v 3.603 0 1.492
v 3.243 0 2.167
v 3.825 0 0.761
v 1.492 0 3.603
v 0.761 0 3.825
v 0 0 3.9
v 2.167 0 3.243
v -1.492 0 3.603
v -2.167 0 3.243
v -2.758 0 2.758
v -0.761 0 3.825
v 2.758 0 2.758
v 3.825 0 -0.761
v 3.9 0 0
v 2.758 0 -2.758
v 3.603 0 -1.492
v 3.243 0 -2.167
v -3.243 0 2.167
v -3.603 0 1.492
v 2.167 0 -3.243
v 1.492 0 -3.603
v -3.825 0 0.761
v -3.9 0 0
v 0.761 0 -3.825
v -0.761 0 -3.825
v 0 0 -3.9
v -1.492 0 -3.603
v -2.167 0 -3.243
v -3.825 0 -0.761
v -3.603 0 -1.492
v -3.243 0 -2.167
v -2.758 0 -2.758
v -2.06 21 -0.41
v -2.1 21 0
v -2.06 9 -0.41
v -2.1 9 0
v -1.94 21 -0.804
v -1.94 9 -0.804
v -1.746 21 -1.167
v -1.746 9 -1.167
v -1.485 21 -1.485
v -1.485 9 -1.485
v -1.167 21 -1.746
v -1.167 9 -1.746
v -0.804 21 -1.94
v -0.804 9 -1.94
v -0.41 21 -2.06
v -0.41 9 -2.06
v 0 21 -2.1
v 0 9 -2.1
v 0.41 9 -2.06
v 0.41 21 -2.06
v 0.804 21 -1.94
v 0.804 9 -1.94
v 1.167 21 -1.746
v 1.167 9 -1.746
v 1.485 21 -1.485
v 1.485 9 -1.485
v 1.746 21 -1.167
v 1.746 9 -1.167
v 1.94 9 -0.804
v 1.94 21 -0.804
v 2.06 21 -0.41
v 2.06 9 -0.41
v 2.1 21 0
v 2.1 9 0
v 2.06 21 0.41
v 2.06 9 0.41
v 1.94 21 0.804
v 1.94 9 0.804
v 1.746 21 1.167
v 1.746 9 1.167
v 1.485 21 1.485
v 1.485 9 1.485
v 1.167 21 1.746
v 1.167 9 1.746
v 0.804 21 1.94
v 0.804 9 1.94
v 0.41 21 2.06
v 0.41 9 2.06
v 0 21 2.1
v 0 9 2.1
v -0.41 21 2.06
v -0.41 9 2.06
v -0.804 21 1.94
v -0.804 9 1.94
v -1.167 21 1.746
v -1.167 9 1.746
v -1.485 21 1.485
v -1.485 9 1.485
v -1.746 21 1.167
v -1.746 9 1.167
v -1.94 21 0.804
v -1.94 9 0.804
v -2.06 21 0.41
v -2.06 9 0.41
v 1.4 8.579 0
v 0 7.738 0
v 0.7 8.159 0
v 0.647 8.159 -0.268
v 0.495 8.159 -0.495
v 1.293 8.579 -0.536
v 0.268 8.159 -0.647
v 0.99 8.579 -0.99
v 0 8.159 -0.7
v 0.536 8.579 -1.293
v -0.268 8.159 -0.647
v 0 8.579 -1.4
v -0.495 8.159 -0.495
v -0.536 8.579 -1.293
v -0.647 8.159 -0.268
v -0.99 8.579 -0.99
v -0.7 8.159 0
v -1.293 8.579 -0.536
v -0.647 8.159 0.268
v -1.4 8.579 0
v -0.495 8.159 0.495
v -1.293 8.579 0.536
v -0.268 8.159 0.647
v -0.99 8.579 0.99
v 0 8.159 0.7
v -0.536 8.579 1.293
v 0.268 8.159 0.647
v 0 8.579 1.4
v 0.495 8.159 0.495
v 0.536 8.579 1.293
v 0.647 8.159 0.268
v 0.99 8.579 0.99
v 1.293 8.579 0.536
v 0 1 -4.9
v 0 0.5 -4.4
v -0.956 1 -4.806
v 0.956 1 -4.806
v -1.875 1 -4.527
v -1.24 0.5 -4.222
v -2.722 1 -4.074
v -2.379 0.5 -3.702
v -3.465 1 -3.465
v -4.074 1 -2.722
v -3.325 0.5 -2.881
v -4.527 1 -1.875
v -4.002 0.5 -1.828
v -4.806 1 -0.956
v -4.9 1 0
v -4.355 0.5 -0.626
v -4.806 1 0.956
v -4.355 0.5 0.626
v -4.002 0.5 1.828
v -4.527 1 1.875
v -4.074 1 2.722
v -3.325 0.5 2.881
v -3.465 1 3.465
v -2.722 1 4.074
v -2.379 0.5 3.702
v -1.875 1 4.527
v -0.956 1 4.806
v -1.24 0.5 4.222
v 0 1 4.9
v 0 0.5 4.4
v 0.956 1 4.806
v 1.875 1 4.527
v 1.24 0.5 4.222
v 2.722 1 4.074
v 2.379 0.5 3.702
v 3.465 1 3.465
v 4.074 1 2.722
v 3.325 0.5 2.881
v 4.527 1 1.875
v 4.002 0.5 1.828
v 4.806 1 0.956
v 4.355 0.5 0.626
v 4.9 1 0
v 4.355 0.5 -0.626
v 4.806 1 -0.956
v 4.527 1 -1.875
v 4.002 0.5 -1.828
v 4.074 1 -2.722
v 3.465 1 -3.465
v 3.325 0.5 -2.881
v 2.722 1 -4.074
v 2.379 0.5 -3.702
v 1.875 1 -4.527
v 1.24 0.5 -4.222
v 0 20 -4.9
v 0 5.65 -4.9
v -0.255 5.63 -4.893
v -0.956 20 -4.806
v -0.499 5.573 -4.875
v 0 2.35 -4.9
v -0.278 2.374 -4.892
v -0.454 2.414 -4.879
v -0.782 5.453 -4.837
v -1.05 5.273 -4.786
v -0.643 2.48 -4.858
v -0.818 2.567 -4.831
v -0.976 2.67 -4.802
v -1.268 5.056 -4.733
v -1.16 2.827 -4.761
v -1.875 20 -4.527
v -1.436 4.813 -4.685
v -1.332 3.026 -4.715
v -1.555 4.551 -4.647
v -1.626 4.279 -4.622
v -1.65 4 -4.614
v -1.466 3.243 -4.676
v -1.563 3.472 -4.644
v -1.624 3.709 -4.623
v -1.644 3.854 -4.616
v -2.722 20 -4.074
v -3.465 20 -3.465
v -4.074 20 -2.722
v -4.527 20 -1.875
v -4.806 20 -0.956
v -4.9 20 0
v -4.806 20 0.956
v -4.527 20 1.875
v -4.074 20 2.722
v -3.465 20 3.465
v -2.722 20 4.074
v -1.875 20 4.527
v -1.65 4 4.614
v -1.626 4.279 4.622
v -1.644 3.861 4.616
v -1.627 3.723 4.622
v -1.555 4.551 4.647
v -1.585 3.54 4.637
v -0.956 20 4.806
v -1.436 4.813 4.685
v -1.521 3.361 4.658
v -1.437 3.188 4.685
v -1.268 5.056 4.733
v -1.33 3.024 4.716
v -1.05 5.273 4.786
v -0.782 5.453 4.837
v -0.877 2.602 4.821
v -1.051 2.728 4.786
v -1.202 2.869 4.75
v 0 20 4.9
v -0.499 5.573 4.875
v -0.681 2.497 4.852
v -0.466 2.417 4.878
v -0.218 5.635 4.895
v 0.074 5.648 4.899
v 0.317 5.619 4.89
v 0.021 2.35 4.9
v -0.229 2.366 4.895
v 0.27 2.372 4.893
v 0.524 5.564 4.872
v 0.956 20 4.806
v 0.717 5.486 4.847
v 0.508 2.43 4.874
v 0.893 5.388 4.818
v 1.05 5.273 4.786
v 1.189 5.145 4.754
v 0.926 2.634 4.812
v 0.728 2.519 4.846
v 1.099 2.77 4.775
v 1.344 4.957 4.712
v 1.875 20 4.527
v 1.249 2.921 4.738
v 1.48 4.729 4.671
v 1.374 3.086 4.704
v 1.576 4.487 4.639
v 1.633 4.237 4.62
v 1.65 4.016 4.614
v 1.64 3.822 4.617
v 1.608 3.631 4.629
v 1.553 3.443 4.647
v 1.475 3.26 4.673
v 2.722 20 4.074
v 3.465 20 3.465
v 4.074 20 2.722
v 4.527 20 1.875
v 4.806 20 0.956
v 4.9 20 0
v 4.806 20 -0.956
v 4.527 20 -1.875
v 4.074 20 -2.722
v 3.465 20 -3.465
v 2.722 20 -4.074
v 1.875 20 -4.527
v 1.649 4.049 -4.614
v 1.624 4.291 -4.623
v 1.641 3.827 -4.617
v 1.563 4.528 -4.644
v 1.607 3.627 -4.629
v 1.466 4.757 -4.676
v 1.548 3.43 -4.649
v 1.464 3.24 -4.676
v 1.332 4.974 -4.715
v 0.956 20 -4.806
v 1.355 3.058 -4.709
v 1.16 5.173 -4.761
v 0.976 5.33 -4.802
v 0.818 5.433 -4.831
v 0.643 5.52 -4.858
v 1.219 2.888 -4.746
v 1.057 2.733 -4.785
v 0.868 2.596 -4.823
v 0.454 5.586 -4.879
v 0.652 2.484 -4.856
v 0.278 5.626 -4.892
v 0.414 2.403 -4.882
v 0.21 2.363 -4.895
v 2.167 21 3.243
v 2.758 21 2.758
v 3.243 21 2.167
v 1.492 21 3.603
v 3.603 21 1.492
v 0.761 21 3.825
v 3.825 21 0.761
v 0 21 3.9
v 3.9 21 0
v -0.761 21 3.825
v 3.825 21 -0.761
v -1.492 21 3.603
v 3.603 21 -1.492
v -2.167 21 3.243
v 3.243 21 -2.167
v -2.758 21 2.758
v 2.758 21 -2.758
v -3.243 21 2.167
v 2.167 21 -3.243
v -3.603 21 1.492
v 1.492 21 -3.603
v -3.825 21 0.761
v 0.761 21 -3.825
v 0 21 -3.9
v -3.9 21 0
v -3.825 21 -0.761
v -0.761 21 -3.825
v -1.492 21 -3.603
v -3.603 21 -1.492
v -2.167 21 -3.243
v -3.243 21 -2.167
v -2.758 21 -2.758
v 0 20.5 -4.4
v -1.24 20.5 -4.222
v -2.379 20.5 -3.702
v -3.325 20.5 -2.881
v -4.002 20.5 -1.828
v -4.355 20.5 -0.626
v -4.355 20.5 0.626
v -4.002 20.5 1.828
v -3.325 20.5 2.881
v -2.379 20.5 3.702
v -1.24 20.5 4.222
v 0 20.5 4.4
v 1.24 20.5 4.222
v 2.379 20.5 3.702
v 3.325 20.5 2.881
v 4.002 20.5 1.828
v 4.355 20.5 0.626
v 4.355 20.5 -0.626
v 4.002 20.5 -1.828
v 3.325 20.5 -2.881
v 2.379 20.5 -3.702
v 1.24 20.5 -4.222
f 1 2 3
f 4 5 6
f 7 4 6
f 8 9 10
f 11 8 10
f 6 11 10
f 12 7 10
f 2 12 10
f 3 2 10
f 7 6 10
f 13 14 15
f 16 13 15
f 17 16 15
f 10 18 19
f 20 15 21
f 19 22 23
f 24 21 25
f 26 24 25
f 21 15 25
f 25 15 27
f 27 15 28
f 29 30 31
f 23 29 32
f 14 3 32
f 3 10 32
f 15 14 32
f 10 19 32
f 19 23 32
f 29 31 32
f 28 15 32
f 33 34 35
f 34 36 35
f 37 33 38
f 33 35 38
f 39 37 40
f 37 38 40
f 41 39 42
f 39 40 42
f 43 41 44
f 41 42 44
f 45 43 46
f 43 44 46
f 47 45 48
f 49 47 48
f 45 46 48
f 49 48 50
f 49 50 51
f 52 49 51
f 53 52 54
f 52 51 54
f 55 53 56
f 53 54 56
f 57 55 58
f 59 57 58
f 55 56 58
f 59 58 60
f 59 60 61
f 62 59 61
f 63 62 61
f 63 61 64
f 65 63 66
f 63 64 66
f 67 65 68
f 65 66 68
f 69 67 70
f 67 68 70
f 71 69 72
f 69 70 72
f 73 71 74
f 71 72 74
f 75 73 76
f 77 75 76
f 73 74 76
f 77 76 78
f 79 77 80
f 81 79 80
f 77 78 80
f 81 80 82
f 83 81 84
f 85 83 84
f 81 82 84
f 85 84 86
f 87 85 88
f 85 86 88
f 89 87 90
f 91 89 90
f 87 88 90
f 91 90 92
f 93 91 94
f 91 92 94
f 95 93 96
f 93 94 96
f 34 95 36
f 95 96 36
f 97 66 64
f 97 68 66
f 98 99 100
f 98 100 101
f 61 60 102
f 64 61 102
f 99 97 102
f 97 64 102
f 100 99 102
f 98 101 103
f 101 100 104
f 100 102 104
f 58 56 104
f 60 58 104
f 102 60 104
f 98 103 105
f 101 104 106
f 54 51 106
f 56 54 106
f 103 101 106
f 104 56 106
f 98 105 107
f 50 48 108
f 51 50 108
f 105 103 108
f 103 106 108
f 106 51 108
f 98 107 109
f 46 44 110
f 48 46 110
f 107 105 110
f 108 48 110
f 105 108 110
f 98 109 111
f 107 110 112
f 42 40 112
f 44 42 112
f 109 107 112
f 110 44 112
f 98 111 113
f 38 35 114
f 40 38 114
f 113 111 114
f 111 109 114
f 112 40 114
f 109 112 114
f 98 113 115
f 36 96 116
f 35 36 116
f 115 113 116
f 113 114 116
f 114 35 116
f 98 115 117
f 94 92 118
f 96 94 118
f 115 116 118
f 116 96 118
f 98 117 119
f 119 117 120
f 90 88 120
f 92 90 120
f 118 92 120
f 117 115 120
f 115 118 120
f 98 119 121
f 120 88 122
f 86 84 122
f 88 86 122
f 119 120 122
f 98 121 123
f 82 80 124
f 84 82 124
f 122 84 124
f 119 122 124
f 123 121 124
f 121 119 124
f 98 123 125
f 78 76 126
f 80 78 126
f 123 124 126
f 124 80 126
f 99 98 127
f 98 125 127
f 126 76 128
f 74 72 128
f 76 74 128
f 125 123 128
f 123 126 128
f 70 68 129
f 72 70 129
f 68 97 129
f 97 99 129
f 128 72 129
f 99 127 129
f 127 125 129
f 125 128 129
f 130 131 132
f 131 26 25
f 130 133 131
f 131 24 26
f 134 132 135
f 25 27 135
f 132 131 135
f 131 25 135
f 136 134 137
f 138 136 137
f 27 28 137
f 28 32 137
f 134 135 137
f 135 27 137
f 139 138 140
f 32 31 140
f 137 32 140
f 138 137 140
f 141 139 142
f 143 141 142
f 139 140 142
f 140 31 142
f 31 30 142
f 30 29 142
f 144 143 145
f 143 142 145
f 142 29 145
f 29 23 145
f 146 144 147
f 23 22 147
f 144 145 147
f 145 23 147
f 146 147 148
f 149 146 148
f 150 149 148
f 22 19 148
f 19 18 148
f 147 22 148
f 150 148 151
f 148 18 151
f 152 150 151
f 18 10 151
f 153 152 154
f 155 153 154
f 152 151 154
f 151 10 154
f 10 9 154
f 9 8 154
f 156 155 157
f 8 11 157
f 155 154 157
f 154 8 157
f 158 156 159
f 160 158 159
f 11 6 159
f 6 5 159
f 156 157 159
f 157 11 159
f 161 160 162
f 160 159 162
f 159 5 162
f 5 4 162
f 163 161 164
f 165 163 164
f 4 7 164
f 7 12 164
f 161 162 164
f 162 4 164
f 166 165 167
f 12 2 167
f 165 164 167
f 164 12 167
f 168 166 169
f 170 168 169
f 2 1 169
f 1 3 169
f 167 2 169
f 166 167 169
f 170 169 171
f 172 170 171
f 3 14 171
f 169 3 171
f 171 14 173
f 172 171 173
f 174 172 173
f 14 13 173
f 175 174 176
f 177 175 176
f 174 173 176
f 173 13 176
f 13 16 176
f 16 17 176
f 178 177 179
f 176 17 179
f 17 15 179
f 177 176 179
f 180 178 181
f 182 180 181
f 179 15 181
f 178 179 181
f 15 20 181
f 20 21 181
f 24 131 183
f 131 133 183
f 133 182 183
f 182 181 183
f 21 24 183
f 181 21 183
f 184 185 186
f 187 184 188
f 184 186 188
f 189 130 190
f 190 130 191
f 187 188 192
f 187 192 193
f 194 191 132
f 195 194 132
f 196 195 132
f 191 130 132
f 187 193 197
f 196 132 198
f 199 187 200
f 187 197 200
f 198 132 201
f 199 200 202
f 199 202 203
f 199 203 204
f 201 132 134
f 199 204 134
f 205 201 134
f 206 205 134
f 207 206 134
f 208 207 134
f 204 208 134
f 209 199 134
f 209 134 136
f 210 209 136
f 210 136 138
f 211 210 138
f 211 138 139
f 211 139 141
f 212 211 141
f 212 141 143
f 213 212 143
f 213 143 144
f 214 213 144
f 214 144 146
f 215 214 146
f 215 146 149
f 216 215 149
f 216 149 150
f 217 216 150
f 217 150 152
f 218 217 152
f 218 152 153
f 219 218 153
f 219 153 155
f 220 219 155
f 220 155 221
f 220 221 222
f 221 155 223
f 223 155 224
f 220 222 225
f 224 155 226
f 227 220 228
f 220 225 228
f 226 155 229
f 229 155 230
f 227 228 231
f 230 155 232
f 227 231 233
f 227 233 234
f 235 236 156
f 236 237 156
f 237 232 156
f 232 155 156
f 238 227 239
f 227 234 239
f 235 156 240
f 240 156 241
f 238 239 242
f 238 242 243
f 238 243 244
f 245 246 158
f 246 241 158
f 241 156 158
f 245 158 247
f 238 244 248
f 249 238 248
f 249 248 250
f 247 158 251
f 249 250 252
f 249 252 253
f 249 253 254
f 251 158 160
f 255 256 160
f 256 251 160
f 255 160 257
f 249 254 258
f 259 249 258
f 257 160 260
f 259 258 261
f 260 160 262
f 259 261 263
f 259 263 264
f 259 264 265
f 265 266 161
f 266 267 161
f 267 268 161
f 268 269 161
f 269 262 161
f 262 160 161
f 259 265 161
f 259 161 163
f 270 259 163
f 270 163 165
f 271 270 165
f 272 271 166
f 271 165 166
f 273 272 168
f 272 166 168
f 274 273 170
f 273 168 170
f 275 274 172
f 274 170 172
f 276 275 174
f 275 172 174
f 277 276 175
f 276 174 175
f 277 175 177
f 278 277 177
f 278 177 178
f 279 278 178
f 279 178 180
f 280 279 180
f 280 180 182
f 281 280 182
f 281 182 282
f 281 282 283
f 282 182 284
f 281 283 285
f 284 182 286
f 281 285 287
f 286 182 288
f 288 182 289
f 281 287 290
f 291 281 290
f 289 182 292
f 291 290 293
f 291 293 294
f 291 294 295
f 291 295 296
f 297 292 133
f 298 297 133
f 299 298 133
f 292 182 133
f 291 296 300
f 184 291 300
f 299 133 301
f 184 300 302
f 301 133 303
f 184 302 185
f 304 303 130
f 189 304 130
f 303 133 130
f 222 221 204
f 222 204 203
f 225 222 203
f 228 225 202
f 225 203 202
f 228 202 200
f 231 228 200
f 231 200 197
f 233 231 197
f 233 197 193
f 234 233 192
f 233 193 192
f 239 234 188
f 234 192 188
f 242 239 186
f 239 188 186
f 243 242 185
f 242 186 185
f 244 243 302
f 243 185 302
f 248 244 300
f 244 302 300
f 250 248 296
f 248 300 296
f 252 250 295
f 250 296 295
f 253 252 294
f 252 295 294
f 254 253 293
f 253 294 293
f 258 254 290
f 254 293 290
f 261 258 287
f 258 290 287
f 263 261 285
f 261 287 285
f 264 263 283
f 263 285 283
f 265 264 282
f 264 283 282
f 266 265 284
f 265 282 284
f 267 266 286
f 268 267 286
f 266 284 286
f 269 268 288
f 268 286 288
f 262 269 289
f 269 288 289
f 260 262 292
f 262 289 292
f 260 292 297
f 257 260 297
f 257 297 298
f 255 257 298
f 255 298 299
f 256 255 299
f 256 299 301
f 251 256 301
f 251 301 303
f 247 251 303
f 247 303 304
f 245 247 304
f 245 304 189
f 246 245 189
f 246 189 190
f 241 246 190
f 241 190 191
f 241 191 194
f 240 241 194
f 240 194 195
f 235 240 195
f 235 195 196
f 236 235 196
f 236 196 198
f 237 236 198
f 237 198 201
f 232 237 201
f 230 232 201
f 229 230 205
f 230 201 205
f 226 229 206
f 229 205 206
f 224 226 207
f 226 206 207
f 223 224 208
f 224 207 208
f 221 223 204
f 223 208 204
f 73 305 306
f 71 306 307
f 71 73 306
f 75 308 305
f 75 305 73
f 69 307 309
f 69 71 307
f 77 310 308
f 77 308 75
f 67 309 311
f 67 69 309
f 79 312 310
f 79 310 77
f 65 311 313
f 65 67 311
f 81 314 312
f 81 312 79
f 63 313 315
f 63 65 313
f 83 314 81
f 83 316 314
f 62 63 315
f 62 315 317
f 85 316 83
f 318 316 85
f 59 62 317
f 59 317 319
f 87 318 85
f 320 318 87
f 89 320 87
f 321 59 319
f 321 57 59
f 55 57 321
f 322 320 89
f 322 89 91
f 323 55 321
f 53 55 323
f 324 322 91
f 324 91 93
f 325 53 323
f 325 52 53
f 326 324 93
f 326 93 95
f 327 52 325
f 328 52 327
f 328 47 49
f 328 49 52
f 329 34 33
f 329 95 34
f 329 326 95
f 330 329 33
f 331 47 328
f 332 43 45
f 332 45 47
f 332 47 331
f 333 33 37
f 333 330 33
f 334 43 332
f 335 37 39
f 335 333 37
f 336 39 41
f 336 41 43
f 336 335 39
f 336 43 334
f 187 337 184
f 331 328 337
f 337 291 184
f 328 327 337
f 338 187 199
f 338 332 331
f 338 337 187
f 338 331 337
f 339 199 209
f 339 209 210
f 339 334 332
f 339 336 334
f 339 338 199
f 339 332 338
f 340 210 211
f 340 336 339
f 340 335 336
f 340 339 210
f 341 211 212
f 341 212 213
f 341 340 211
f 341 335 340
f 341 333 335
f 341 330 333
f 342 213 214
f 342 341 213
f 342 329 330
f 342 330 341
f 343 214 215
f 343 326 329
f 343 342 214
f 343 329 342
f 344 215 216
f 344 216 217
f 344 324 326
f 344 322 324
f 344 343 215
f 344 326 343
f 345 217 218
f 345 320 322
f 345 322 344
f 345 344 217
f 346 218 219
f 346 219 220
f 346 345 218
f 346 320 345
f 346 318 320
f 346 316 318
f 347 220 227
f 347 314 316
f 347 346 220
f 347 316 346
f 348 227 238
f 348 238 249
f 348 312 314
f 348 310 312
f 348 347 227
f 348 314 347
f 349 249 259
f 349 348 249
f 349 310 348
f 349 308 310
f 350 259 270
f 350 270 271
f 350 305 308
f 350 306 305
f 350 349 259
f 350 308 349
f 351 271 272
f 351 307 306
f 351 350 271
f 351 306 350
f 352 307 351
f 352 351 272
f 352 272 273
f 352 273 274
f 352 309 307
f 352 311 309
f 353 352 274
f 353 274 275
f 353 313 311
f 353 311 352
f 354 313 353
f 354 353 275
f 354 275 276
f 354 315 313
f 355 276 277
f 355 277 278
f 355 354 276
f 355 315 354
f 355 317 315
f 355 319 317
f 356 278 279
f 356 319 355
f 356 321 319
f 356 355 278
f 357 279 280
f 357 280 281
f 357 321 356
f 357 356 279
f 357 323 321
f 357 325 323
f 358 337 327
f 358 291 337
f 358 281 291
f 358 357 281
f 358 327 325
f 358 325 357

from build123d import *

# Parameters (mm, degrees)
SKETCH_1_R             = 4.9
EXTRUDE_1_DEPTH        = 21
HOLE_WIZARD_M4_1_D     = 3.3
HOLE_WIZARD_M5_1_D     = 4.2
HOLE_WIZARD_M5_1_DEPTH = 12
HOLE_WIZARD_M5_1_TIP   = 1.2618073
CHAMFER_1_SIZE         = 1


with BuildPart() as part:
    # 草图1 → 凸台-拉伸1 (new body)
    with BuildSketch(Plane(origin=(0, 0, 0), x_dir=(1, 0, 0), z_dir=(0, 1, 0))):
        with Locations(Location((0, 0, 0), (0, 0, 90))):
            Circle(SKETCH_1_R)
    extrude(amount=EXTRUDE_1_DEPTH)

    # M4 螺纹孔1 (through all)
    with Locations(Plane.XY.offset(4.9)):
        with Locations((0, 4)):
            Hole(HOLE_WIZARD_M4_1_D / 2)

    # M5 螺纹孔1
    with Locations(Plane(origin=(0, 21, 0), x_dir=(1, 0, 0), z_dir=(0, 1, 0))):
        with Locations((0, 0)):
            Hole(HOLE_WIZARD_M5_1_D / 2, depth=HOLE_WIZARD_M5_1_DEPTH)
            with Locations((0, 0, -(HOLE_WIZARD_M5_1_DEPTH + HOLE_WIZARD_M5_1_TIP / 2))):  # 118° drill point
                Cone(0, HOLE_WIZARD_M5_1_D / 2, HOLE_WIZARD_M5_1_TIP, mode=Mode.SUBTRACT)

    # 倒角1
    chamfer_1_edges = [part.edges().sort_by_distance(p)[0] for p in [
        (0, 0, 4.9),
        (0, 21, 4.9),
    ]]
    chamfer(chamfer_1_edges, length=CHAMFER_1_SIZE)


solid = part.part
